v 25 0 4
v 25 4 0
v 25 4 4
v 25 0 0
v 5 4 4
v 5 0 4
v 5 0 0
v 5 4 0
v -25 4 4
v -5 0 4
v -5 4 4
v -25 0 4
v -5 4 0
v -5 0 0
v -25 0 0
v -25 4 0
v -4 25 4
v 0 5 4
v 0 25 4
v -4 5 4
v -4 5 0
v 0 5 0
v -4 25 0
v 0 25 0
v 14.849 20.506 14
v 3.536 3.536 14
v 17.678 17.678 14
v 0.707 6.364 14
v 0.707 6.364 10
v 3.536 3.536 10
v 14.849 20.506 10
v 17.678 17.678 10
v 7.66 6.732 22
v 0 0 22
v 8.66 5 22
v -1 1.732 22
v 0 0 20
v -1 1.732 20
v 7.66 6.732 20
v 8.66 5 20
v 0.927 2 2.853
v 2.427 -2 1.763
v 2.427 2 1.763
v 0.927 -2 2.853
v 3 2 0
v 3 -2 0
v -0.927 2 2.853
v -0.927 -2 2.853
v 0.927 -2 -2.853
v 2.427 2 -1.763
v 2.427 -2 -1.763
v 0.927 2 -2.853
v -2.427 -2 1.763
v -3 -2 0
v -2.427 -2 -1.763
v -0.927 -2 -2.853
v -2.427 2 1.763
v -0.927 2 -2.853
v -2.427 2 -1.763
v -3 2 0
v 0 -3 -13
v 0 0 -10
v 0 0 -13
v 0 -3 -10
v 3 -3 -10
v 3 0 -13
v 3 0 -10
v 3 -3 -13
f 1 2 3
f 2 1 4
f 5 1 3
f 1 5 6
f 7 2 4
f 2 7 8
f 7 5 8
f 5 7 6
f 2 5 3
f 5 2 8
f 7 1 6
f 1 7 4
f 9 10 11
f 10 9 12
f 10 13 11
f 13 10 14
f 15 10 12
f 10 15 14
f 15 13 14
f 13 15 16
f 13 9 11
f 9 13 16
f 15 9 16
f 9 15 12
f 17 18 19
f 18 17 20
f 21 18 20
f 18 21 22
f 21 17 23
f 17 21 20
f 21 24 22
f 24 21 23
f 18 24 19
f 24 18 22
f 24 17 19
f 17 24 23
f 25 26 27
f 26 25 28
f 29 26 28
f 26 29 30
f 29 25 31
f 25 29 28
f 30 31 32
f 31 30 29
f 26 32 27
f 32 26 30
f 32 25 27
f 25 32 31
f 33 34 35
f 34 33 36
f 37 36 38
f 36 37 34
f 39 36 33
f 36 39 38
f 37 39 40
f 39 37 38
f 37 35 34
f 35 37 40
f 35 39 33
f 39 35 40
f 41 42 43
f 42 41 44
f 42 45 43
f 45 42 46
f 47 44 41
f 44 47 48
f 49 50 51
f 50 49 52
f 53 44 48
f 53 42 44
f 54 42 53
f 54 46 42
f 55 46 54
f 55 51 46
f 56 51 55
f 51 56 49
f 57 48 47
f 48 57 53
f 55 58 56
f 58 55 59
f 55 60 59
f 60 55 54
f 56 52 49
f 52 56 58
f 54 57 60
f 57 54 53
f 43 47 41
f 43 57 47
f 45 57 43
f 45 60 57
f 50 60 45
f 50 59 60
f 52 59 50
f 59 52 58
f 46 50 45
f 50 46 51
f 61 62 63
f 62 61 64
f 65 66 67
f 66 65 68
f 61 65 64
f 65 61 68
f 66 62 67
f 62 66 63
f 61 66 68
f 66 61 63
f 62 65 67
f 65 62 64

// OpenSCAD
// Zweck: rotate in all forms and mirror – star-shaped bracket.
module arm() translate([5, 0, 0]) cube([20, 4, 4]);
arm();
mirror([1, 0, 0]) arm();
rotate([0, 0, 90]) arm();
rotate(a = 45, v = [0, 0, 1]) translate([0, 0, 10]) arm();
rotate(30) translate([0, 0, 20]) cube([10, 2, 2]);
rotate([90, 0, 0]) translate([0, 0, -2]) cylinder(h = 4, r = 3);
mirror([0, 1, 1]) translate([0, 10, 0]) cube(3);
